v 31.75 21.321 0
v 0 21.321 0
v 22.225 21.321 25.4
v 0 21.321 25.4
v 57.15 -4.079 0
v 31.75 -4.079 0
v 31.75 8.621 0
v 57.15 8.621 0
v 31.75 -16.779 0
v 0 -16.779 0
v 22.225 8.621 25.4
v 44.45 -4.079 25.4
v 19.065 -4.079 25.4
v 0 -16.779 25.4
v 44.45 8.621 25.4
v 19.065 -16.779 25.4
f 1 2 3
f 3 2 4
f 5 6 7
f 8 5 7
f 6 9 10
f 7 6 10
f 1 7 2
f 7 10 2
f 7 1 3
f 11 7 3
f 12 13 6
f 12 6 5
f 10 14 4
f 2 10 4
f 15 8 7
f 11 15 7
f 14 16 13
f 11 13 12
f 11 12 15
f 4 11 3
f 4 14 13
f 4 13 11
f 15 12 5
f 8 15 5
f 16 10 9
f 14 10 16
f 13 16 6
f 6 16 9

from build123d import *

# Parameters (mm, degrees)
F0_W     = 38.1
F0_H     = 25.4
F1_DEPTH = 57.15
F3_DEPTH = 38.101
F5_DEPTH = 12.7
F7_DEPTH = 12.7


with BuildPart() as f1:
    # F0 (on Right) → F1 (new body)
    with BuildSketch(Plane.YZ):
        with Locations((2.271346, 12.7)):
            Rectangle(F0_W, F0_H)
    extrude(amount=F1_DEPTH)

    # F2 (on face) → F3 (cut, through all)
    with BuildSketch(Plane.XZ.offset(16.778654)):
        Polygon((44.45, 25.4), (57.15, 0), (57.15, 25.4), align=None)
    extrude(amount=-F3_DEPTH, mode=Mode.SUBTRACT)

    # F4 (on face) → F5 (cut)
    with BuildSketch(Plane.XZ.offset(16.778654)):
        Polygon((44.45, 25.4), (19.065139, 25.4), (31.75, 0), (57.15, 0), align=None)
    extrude(amount=-F5_DEPTH, mode=Mode.SUBTRACT)

    # F6 (on face) → F7 (cut)
    with BuildSketch(Plane(origin=(0, 21.321346, 0), x_dir=(-1, 0, 0), z_dir=(0, 1, 0))):
        Polygon((-57.15, 0), (-31.75, 0), (-22.225, 25.4), (-44.45, 25.4), align=None)
    extrude(amount=-F7_DEPTH, mode=Mode.SUBTRACT)


solid = f1.part
